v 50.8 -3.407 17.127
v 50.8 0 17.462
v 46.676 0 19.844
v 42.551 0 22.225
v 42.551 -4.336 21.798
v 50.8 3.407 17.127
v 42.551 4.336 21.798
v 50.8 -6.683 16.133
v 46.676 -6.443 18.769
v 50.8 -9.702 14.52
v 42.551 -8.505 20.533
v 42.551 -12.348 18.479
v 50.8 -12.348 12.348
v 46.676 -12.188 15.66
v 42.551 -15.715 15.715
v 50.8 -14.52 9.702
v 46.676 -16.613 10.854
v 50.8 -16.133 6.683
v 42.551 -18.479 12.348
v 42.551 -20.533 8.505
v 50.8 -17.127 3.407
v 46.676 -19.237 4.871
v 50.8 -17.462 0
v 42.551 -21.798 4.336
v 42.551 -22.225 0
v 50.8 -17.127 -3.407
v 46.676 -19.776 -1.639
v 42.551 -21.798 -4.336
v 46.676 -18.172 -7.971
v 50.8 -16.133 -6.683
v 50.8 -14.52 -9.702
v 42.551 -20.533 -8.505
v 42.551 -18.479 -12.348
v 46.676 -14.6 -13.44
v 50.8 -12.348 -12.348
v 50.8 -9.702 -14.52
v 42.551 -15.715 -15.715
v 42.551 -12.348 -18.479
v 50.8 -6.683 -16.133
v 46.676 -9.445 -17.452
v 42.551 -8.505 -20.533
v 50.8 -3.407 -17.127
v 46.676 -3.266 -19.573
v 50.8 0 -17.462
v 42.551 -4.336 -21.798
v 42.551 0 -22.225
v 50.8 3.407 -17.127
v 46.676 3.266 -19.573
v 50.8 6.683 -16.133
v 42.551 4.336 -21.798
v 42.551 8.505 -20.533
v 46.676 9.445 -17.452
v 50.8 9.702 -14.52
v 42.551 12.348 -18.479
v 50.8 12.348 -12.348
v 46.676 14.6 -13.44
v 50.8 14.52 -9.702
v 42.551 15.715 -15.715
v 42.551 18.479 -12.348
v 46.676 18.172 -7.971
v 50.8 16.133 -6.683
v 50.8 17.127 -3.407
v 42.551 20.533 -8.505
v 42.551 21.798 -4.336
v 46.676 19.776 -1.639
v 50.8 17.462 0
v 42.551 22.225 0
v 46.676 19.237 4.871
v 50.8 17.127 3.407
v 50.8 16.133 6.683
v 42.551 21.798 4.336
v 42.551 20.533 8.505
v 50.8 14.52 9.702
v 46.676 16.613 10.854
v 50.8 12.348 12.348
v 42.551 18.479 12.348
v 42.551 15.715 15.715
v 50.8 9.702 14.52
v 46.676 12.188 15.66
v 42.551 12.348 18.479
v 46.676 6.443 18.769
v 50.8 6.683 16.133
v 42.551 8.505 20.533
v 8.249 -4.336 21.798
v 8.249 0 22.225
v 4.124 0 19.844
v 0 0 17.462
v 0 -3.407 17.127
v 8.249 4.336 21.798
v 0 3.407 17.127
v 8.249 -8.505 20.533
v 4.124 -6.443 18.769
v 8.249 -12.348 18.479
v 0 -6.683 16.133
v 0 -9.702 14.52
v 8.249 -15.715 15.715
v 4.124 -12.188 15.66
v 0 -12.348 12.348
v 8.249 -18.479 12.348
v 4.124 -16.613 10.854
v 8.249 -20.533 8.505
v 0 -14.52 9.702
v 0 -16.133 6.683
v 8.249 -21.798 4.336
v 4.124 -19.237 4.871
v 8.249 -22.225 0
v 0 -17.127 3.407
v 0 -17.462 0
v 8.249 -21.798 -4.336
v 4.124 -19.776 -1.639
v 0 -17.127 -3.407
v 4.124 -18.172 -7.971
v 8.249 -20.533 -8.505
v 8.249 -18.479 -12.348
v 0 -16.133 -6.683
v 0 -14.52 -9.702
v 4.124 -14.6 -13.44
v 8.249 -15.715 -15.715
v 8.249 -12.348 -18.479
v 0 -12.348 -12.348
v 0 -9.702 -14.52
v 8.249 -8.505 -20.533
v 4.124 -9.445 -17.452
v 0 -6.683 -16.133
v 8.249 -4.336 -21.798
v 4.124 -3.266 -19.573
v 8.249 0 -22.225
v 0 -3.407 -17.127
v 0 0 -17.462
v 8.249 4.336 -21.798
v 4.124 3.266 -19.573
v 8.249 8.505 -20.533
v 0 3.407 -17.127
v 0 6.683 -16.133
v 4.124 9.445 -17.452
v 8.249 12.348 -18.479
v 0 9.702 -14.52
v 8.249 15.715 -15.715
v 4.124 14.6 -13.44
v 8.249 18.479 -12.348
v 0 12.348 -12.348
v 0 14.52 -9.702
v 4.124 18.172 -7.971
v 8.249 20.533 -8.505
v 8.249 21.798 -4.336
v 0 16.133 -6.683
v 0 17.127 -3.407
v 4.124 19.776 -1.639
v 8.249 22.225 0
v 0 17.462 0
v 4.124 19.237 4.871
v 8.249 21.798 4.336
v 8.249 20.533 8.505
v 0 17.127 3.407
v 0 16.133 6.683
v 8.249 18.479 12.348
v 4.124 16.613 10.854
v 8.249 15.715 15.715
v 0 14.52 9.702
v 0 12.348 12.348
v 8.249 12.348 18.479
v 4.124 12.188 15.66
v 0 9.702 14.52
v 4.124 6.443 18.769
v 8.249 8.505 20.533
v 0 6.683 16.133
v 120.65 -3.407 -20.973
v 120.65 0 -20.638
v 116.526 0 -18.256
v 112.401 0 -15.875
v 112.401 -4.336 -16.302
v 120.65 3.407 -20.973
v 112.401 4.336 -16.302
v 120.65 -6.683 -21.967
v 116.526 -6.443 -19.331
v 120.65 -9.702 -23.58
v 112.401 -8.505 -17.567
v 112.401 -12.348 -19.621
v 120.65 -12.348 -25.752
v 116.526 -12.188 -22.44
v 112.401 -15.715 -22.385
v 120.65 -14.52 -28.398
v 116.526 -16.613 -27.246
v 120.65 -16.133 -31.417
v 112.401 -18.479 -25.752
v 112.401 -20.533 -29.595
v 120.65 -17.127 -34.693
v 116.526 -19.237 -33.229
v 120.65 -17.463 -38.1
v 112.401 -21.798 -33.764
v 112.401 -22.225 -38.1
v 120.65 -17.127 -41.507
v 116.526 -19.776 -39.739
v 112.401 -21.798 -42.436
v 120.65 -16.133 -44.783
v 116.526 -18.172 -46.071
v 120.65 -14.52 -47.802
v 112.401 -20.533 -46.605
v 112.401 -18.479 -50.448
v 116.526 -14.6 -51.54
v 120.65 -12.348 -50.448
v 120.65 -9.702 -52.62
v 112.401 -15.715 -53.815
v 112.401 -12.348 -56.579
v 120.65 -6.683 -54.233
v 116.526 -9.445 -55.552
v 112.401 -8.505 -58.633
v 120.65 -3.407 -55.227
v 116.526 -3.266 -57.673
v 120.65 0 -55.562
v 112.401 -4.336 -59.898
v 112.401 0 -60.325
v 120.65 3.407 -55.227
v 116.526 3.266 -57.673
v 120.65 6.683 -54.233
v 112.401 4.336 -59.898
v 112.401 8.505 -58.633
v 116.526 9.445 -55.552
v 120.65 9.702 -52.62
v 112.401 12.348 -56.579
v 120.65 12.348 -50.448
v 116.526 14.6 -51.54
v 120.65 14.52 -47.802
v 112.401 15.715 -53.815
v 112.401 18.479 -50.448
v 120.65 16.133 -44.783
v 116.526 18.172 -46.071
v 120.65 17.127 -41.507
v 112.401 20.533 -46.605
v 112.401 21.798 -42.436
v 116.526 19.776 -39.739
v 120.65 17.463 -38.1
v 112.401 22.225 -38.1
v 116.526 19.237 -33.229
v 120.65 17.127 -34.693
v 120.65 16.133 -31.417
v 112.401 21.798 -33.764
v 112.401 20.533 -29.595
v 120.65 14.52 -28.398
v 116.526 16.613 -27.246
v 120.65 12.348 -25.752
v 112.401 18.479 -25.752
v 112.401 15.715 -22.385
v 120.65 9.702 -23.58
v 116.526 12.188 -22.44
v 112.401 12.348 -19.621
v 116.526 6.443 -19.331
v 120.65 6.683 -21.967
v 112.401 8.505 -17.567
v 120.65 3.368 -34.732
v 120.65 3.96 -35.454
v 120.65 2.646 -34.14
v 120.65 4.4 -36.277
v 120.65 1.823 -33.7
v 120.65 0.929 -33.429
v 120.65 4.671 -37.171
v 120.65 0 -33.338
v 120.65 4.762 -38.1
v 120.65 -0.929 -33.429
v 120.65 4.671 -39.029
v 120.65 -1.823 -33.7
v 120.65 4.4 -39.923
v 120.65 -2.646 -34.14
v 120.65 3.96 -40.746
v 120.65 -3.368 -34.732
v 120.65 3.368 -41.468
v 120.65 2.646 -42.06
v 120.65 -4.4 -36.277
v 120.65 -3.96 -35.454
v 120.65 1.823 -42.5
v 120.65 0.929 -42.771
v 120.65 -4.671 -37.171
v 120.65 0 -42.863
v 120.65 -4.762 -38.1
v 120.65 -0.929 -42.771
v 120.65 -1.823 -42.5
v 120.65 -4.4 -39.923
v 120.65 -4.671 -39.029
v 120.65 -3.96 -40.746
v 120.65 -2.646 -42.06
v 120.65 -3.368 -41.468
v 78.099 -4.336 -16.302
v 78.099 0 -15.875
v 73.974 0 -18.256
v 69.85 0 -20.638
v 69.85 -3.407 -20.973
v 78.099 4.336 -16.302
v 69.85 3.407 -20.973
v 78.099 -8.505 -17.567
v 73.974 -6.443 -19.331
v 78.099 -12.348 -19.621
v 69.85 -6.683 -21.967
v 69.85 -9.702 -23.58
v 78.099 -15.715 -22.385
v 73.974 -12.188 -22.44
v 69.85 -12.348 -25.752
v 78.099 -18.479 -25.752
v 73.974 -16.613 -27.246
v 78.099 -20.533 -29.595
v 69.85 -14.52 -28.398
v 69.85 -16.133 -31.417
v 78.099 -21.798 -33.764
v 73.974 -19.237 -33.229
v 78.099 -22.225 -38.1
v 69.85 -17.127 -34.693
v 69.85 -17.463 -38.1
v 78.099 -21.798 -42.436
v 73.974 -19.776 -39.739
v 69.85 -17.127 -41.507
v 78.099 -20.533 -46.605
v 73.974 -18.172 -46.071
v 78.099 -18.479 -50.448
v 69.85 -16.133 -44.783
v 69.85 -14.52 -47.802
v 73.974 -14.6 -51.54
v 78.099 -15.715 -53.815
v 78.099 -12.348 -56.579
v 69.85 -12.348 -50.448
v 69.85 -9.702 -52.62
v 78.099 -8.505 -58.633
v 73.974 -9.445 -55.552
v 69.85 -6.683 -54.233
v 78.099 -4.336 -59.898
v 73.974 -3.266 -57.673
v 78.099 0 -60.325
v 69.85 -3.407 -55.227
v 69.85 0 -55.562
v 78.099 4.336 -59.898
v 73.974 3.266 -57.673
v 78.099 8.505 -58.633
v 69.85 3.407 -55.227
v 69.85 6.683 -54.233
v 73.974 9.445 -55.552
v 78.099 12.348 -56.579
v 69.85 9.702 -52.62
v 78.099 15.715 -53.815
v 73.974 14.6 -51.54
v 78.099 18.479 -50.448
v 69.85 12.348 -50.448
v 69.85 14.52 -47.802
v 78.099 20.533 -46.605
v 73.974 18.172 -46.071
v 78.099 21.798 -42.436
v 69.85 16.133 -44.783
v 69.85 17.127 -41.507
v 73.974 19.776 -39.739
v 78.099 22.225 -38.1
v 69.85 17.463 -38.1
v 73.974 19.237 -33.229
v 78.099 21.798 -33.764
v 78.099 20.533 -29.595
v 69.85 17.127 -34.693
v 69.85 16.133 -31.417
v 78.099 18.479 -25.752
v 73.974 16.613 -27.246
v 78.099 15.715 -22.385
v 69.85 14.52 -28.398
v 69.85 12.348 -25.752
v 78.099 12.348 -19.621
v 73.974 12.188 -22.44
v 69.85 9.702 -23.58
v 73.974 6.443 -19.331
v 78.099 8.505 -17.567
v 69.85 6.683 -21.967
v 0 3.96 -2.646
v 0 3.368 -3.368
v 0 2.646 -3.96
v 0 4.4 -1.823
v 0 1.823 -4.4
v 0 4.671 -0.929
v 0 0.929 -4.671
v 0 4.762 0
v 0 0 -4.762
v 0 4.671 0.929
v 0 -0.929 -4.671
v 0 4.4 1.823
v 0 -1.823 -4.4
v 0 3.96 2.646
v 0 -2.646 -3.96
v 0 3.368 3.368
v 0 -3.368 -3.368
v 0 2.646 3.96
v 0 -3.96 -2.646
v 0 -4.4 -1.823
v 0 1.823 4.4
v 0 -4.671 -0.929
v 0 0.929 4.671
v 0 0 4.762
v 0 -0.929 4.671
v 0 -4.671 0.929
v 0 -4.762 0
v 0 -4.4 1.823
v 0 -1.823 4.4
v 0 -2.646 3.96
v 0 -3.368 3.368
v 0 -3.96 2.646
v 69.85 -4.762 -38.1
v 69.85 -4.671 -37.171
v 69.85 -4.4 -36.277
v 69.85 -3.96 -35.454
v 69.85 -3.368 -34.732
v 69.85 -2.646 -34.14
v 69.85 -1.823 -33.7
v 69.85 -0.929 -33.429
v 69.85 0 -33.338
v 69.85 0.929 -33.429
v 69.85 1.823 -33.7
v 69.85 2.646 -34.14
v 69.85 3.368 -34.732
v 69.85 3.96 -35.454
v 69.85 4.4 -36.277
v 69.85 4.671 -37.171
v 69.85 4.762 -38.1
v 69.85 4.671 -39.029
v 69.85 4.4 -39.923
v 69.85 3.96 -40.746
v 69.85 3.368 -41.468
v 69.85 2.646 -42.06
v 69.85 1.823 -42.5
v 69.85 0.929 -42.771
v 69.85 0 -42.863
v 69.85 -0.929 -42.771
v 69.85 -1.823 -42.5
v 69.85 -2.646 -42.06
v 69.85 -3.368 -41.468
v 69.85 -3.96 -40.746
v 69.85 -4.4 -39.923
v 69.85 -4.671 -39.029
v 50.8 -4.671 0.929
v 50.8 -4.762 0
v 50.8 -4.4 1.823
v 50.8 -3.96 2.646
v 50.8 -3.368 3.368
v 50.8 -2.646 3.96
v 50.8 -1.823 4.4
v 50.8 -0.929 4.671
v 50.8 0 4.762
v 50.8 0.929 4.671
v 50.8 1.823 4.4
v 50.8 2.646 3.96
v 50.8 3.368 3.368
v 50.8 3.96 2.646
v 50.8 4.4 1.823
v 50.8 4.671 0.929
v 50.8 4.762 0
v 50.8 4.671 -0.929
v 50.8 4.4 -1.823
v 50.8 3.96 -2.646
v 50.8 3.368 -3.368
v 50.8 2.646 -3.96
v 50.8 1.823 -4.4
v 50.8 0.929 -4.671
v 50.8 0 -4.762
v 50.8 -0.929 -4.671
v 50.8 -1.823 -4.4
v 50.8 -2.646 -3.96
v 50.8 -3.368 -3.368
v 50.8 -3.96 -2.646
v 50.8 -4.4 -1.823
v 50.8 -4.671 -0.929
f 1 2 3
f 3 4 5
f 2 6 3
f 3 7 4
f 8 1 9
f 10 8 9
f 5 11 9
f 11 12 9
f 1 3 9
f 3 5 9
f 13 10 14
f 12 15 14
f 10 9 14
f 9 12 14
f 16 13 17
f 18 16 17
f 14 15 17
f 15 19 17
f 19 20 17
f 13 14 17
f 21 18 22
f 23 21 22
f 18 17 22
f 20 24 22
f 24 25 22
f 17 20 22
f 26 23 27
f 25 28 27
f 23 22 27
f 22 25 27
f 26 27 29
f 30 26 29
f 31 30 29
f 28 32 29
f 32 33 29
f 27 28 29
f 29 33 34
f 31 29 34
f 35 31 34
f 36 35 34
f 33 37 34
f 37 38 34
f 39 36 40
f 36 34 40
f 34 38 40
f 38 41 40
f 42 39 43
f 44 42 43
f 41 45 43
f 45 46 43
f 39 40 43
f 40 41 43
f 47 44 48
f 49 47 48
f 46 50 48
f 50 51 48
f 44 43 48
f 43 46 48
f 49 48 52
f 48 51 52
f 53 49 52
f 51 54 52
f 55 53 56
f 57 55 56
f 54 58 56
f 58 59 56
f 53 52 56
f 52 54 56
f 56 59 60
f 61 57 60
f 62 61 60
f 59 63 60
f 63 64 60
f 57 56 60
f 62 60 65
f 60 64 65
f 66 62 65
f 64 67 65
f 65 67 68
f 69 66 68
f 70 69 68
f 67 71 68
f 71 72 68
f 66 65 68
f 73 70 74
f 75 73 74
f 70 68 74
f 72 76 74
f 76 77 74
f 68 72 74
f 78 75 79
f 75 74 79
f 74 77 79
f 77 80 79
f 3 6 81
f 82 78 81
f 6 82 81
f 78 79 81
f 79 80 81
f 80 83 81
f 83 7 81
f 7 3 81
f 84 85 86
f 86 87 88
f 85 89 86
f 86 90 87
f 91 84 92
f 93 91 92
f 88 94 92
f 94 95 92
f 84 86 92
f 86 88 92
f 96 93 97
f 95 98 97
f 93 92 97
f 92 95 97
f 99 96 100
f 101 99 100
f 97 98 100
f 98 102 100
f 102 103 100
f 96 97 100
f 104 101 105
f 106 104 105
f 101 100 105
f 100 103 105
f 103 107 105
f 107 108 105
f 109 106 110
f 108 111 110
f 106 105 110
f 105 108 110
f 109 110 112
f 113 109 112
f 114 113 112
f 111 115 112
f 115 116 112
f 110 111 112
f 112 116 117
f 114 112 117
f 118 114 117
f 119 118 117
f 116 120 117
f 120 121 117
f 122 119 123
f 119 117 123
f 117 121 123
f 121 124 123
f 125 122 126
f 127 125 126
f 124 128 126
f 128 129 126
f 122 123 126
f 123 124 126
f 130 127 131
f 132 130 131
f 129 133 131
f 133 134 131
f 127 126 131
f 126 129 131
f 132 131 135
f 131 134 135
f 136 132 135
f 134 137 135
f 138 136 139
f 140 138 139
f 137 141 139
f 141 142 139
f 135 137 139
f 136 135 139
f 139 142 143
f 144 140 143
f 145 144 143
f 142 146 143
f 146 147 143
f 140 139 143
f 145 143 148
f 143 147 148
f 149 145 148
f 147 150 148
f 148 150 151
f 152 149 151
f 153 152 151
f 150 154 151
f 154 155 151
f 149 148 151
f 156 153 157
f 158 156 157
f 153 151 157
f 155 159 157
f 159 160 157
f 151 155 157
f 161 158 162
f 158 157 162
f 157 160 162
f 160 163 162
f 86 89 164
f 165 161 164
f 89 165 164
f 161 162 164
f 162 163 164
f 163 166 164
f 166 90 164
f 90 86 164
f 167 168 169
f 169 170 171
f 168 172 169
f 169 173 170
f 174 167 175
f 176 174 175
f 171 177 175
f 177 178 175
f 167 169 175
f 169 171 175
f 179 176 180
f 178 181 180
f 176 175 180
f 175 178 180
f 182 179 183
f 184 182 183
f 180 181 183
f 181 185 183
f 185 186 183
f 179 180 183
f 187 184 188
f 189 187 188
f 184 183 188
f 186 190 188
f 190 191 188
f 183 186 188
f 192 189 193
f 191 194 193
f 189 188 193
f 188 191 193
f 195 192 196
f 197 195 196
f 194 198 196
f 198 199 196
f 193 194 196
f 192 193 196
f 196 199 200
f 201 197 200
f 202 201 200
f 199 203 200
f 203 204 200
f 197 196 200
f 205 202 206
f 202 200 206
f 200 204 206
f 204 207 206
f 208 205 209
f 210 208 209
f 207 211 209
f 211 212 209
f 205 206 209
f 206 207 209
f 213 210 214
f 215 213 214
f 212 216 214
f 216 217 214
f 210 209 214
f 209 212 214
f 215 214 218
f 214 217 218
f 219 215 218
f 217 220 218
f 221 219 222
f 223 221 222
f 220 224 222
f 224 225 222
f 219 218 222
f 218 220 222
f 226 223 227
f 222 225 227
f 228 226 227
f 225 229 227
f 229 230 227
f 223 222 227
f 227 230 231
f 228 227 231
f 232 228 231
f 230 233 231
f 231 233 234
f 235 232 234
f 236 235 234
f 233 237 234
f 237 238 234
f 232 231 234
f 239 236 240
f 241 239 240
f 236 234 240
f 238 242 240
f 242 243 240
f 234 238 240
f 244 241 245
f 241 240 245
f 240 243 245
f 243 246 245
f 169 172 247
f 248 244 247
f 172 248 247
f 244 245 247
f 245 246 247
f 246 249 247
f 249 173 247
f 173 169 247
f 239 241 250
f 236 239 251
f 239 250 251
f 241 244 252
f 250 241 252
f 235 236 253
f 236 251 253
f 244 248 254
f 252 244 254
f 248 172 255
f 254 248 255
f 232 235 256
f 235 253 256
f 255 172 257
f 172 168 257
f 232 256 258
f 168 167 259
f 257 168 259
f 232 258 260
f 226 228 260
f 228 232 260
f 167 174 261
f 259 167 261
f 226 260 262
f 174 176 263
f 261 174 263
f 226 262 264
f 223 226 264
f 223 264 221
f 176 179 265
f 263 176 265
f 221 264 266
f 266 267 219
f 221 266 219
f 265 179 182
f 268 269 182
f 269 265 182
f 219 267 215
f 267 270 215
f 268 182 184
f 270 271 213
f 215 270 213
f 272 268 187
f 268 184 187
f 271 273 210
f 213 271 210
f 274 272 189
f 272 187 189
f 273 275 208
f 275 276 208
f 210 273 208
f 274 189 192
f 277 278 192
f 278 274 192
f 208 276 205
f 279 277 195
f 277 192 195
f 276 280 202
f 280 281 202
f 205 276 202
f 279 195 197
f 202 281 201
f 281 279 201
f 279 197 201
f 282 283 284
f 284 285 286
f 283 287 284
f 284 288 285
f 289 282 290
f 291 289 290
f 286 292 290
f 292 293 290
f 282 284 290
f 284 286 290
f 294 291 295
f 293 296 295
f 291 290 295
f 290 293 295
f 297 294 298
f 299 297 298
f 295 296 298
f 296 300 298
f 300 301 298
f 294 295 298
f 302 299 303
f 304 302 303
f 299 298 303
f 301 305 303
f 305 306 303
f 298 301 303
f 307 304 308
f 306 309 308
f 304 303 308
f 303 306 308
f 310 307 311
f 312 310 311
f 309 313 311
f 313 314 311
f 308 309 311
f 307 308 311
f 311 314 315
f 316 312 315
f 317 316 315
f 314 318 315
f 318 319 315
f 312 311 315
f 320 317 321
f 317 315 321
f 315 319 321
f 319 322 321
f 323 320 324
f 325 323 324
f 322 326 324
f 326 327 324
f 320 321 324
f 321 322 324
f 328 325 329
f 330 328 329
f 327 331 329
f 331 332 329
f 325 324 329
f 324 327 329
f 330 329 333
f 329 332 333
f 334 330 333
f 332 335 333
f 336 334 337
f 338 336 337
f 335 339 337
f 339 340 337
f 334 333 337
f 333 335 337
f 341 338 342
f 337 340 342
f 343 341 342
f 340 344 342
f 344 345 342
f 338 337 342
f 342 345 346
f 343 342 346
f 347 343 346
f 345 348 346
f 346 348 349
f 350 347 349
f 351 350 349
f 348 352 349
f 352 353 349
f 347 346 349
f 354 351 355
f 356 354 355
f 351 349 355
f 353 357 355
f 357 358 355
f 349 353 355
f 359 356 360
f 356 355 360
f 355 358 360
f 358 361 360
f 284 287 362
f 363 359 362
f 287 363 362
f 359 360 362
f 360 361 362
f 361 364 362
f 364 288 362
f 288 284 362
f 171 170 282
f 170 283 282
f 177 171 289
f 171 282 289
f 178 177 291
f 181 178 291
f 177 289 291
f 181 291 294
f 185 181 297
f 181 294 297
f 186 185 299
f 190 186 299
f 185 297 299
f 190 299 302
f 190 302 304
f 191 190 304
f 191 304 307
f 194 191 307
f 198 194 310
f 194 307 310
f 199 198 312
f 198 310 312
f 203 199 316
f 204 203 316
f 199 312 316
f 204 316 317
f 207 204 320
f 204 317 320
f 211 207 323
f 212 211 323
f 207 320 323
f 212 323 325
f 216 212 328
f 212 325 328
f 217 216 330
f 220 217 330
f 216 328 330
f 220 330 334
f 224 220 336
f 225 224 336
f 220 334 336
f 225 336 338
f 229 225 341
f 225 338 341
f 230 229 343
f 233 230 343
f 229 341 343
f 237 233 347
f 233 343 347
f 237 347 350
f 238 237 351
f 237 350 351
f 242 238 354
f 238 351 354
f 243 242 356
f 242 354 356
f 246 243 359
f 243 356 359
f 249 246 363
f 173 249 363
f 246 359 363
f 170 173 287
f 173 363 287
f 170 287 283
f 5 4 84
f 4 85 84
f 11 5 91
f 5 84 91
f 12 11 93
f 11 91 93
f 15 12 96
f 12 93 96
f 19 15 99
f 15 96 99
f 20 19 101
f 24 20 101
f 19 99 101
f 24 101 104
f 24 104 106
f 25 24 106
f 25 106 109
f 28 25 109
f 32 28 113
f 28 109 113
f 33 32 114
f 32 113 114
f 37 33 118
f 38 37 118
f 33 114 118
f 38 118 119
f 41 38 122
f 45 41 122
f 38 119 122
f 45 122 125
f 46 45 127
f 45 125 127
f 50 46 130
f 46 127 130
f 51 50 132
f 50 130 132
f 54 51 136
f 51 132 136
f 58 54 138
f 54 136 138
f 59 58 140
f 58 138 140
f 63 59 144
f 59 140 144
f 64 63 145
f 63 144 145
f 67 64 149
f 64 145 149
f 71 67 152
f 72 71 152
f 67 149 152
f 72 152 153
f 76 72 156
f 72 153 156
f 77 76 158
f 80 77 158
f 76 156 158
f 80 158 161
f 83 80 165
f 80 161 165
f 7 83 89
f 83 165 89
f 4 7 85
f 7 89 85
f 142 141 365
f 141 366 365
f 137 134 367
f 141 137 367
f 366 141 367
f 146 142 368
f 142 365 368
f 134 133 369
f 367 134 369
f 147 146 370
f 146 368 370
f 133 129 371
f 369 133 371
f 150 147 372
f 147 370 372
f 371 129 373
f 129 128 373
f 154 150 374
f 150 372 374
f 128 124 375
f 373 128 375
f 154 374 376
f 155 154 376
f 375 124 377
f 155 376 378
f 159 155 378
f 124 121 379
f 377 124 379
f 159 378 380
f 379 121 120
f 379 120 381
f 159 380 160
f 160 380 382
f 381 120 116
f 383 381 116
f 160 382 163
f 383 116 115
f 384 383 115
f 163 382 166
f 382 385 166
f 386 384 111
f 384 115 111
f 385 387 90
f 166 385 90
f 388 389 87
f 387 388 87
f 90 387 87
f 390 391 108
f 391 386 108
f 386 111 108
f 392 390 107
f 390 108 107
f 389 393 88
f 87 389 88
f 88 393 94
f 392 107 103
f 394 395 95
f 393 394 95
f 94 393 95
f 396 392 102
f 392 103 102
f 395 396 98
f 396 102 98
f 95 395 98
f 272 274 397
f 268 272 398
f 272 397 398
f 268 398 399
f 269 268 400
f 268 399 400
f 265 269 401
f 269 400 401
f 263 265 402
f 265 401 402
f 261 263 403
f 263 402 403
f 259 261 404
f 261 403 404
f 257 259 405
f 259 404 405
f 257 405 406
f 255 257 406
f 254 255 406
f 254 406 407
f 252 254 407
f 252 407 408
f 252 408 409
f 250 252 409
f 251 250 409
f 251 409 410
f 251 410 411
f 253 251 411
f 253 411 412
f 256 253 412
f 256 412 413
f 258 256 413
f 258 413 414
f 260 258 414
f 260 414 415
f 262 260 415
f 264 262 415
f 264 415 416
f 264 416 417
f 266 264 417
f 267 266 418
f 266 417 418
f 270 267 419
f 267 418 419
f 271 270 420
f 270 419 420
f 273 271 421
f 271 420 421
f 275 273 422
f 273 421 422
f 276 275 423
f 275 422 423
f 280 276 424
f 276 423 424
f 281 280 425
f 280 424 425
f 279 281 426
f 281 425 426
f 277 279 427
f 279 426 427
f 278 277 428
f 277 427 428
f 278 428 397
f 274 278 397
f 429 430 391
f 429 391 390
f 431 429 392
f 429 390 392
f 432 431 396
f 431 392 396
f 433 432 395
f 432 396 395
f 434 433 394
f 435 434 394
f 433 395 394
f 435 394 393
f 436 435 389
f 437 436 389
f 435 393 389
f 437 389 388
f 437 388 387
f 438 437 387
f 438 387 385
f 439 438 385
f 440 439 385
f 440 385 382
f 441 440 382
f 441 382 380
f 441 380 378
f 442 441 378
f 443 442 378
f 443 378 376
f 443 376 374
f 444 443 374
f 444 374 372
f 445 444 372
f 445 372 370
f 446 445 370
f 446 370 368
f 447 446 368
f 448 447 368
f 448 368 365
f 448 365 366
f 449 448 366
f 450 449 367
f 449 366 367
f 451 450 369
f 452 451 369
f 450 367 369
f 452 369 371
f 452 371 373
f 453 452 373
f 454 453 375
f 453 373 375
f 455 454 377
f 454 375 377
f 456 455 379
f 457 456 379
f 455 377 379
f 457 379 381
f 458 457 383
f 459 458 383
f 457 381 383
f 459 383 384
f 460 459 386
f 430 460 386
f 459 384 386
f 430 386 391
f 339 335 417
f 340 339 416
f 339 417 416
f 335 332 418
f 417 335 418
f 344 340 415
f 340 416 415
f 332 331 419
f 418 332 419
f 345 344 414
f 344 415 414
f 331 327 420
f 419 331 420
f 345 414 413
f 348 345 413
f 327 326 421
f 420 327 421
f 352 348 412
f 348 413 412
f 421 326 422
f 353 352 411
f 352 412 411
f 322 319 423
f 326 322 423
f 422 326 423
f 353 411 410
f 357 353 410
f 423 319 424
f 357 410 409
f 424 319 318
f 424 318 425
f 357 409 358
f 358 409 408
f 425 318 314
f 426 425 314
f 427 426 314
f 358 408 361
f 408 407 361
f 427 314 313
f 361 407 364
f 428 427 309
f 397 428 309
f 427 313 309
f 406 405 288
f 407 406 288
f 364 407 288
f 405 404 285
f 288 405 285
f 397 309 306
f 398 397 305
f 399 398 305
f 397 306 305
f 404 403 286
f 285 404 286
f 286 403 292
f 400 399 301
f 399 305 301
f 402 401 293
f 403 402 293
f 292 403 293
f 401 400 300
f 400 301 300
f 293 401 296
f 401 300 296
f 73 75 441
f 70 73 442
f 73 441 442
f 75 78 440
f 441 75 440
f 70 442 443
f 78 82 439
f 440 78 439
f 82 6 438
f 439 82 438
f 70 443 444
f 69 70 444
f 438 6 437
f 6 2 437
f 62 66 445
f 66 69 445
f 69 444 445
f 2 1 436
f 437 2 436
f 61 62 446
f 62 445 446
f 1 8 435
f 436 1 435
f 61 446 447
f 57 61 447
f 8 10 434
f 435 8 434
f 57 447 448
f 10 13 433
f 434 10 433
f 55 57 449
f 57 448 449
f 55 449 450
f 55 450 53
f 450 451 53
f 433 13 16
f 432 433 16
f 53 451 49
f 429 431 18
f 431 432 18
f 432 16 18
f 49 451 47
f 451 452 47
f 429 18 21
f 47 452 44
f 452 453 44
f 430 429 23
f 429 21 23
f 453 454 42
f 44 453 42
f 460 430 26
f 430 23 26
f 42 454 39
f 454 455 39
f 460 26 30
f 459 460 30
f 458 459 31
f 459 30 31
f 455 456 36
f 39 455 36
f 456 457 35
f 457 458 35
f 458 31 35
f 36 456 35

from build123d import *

# Parameters (mm, degrees)
F3_R     = 4.7625
F4_DEPTH = 120.651


with BuildPart() as f1:
    # F0 (on Front) → F1 (revolve)
    with BuildSketch(Plane.XZ):
        Polygon((0, 17.4625), (0, 0), (50.8, 0), (50.8, 17.4625), (42.551108, 22.225), (8.248892, 22.225), align=None)
    revolve(axis=Axis((25.4, 0, 0), (1, 0, 0)))


with BuildPart() as f2:
    # F0 (on Front) → F2 (revolve)
    with BuildSketch(Plane.XZ):
        Polygon((69.85, -20.6375), (69.85, -38.1), (120.65, -38.1), (120.65, -20.6375), (112.401108, -15.875), (78.098892, -15.875), align=None)
    revolve(axis=Axis((95.25, 0, -38.1), (1, 0, 0)))


with BuildPart() as f4_tool:
    # F3 (on face) → F4 (new body, through all)
    with BuildSketch(Plane(origin=(0, 0, 0), x_dir=(0, -1, 0), z_dir=(-1, 0, 0))):
        Circle(F3_R)
        with Locations((0, -38.1)):
            Circle(F3_R)
    extrude(amount=-F4_DEPTH)


with BuildPart() as f1_1:
    add(f1.part)

    # F4: cut by f4_tool
    add(f4_tool.part, mode=Mode.SUBTRACT)


with BuildPart() as f2_1:
    add(f2.part)

    # F4: cut by f4_tool
    add(f4_tool.part, mode=Mode.SUBTRACT)


solid = Compound([f1_1.part, f2_1.part])
